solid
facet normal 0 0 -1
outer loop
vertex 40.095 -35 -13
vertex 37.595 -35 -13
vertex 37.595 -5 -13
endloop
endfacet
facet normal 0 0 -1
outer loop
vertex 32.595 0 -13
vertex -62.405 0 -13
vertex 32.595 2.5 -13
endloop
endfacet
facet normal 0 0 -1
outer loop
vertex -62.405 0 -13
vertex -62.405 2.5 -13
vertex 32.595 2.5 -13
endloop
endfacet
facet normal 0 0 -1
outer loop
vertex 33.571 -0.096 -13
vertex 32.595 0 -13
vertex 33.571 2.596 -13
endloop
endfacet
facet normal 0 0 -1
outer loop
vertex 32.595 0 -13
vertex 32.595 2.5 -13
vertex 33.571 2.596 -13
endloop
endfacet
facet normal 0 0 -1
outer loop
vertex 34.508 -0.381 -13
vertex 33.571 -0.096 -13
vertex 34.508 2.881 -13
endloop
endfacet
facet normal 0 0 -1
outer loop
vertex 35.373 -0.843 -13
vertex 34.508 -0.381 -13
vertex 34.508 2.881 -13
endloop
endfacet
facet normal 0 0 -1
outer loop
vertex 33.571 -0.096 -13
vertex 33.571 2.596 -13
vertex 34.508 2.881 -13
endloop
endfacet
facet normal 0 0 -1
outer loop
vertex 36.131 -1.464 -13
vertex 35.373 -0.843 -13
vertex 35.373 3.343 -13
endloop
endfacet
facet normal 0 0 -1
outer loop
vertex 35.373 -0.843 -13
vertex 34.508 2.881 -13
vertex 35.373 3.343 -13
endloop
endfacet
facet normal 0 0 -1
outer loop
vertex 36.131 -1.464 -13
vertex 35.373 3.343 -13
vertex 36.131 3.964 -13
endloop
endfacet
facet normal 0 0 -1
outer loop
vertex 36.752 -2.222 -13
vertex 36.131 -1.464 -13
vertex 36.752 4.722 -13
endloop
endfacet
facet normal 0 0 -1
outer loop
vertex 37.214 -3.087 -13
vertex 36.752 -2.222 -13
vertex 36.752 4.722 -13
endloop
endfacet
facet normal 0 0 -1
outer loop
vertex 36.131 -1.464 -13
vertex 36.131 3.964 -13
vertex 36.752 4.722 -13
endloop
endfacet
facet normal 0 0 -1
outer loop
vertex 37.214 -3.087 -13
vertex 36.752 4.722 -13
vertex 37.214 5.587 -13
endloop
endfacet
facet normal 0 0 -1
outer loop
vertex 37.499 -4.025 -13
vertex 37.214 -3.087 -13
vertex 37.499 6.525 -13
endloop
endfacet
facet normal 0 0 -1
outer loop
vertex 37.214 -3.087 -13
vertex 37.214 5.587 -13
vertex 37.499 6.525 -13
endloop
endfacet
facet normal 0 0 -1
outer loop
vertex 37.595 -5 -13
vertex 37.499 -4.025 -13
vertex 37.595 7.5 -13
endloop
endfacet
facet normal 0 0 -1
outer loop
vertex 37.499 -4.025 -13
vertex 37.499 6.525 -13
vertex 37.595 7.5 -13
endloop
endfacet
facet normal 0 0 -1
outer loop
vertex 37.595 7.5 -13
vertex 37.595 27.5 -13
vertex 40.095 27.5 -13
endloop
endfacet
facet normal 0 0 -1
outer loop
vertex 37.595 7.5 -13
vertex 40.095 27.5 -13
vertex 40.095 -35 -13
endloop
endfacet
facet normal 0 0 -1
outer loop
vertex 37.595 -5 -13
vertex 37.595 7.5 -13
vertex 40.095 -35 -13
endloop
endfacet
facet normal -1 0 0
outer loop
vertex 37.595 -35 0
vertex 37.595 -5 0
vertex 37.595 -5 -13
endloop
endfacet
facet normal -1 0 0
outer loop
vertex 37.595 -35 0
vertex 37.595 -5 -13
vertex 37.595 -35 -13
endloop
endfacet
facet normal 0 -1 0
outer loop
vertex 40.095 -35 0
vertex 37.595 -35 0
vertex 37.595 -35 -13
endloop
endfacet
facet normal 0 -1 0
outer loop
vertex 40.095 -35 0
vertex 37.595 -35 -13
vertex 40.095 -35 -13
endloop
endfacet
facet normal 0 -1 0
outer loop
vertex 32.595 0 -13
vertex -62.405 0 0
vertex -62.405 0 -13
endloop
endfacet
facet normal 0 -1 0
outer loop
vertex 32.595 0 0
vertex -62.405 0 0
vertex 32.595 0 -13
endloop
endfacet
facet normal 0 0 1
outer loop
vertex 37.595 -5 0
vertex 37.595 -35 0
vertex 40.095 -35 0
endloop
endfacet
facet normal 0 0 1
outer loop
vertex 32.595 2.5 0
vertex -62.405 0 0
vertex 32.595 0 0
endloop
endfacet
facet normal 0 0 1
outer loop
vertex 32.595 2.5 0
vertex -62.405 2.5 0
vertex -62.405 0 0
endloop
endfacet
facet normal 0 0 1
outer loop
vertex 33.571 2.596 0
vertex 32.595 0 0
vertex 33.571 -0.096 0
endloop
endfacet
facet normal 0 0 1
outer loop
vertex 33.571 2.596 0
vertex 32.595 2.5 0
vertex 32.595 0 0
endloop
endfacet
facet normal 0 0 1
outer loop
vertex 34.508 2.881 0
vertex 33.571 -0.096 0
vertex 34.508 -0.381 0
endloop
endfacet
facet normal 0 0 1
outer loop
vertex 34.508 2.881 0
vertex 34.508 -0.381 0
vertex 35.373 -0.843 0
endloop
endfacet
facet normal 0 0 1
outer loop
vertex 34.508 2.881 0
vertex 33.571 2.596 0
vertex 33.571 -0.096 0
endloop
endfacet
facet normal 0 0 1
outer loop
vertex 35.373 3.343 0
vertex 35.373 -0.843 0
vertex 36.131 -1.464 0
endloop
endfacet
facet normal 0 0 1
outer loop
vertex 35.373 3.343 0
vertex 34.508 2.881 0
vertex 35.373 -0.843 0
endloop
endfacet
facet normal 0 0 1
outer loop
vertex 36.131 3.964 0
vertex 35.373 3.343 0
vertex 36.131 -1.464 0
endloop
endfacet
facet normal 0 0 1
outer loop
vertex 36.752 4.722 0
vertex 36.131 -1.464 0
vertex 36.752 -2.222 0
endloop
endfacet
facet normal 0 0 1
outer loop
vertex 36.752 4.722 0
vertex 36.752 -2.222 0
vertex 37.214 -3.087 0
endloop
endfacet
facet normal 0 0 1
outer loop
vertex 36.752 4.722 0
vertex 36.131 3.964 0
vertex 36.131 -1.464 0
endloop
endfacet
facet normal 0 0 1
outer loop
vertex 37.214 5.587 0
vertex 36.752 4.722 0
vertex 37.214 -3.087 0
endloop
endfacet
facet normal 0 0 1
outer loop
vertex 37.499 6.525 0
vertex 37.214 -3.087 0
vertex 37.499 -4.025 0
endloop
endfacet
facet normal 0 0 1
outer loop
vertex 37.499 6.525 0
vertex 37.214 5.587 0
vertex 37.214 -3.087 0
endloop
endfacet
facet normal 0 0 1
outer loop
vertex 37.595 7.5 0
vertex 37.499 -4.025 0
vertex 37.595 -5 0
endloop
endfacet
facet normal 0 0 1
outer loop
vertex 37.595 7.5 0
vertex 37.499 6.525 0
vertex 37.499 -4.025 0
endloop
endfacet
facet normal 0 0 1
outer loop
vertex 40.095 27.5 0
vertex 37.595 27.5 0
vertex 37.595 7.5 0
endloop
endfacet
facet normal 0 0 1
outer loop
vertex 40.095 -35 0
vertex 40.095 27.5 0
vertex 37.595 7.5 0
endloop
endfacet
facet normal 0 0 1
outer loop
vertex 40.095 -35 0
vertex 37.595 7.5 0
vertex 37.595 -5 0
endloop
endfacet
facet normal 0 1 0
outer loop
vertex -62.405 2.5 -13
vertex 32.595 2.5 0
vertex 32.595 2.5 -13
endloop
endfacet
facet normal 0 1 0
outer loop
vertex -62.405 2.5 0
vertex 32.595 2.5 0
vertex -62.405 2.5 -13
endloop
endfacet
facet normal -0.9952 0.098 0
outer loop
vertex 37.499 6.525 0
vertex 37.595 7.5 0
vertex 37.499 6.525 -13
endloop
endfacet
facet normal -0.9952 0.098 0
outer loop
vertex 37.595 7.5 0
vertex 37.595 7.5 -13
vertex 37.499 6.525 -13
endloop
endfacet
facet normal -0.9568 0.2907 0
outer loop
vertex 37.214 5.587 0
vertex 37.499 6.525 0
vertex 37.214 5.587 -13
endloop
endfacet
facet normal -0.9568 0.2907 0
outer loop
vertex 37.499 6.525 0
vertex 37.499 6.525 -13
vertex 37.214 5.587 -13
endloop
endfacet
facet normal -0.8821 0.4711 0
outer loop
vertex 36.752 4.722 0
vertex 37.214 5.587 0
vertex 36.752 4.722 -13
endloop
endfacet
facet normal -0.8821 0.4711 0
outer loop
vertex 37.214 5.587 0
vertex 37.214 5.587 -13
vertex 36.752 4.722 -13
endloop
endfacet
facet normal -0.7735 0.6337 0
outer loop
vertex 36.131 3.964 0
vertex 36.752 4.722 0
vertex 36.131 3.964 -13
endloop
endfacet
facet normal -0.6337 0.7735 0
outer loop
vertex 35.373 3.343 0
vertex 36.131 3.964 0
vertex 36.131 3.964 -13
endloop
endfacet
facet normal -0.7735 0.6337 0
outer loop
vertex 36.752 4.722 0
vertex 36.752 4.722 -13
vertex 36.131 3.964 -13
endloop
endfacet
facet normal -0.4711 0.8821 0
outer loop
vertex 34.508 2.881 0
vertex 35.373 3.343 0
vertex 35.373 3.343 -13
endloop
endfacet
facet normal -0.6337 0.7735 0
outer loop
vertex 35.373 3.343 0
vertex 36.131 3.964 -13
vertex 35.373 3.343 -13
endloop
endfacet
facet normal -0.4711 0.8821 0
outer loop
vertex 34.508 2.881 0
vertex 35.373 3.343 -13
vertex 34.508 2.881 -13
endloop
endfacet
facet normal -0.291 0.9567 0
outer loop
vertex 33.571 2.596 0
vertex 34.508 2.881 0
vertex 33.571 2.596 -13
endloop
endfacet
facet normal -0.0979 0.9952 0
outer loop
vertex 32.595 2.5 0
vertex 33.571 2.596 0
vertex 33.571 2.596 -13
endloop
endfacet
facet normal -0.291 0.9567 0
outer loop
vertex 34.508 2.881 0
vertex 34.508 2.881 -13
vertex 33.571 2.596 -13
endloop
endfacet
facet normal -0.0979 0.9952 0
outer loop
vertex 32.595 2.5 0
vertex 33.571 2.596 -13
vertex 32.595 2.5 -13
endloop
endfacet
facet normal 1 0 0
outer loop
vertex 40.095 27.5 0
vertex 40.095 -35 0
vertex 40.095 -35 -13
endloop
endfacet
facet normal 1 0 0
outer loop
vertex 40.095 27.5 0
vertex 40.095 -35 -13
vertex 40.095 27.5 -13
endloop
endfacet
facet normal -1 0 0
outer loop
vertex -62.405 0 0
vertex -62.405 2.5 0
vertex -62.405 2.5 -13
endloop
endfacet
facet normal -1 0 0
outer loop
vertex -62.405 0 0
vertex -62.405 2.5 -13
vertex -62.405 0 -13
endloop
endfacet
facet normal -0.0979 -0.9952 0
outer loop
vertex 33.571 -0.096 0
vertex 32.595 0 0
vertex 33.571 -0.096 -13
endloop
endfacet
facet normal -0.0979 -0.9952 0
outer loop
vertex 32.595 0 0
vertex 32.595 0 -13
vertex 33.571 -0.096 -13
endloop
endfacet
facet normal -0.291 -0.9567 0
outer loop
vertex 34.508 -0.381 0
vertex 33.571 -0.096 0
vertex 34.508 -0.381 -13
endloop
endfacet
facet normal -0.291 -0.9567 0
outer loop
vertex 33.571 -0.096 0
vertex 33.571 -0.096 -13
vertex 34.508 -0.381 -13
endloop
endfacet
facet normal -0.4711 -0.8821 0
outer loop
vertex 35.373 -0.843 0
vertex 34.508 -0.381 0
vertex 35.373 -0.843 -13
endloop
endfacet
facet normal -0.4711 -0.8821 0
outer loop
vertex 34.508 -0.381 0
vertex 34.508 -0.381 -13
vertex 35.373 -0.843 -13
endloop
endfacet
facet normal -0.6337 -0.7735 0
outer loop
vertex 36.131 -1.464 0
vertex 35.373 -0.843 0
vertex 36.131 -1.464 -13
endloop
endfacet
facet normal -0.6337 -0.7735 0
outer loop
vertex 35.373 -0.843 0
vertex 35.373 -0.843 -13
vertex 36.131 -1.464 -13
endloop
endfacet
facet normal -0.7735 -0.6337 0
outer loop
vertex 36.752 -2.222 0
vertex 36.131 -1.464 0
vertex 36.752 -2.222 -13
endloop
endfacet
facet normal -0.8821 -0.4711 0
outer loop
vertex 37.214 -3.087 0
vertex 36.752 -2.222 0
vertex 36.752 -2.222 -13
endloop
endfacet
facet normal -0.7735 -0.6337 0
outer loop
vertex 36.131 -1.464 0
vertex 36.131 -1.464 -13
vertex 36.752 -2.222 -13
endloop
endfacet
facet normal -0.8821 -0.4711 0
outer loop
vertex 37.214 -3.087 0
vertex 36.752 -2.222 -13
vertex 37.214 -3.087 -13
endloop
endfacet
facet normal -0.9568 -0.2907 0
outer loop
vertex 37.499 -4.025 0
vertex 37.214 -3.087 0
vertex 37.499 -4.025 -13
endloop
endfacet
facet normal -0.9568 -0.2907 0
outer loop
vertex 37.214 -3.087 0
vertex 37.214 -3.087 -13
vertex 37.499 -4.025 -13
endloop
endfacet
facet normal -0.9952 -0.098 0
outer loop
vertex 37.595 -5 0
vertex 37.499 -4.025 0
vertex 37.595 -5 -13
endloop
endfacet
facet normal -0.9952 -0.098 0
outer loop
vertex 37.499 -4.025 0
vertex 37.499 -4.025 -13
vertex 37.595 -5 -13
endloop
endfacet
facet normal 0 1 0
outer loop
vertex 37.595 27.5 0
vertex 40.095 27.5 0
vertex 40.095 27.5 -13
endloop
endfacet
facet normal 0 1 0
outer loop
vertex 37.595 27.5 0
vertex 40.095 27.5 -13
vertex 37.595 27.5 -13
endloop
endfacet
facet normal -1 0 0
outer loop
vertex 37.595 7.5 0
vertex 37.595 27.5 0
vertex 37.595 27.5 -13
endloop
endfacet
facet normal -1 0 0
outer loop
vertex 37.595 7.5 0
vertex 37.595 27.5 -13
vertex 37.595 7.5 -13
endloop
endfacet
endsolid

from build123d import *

# Parameters (mm, degrees)
F1_DEPTH = 13
F2_R     = 5


with BuildPart() as f1:
    # F0 (on Top) → F1 (new body)
    with BuildSketch(Plane.XY):
        Polygon((-62.404933, 2.5), (-62.404933, 0), (37.595067, 0), (37.595067, -35), (40.095067, -35), (40.095067, 27.5), (37.595067, 27.5), (37.595067, 2.5), align=None)
    extrude(amount=-F1_DEPTH)

    # F2
    f2_edges = [f1.edges().sort_by_distance(p)[0] for p in [
        (37.595067, 0, -6.5),
        (37.595067, 2.5, -6.5),
    ]]
    fillet(f2_edges, radius=F2_R)


solid = f1.part
